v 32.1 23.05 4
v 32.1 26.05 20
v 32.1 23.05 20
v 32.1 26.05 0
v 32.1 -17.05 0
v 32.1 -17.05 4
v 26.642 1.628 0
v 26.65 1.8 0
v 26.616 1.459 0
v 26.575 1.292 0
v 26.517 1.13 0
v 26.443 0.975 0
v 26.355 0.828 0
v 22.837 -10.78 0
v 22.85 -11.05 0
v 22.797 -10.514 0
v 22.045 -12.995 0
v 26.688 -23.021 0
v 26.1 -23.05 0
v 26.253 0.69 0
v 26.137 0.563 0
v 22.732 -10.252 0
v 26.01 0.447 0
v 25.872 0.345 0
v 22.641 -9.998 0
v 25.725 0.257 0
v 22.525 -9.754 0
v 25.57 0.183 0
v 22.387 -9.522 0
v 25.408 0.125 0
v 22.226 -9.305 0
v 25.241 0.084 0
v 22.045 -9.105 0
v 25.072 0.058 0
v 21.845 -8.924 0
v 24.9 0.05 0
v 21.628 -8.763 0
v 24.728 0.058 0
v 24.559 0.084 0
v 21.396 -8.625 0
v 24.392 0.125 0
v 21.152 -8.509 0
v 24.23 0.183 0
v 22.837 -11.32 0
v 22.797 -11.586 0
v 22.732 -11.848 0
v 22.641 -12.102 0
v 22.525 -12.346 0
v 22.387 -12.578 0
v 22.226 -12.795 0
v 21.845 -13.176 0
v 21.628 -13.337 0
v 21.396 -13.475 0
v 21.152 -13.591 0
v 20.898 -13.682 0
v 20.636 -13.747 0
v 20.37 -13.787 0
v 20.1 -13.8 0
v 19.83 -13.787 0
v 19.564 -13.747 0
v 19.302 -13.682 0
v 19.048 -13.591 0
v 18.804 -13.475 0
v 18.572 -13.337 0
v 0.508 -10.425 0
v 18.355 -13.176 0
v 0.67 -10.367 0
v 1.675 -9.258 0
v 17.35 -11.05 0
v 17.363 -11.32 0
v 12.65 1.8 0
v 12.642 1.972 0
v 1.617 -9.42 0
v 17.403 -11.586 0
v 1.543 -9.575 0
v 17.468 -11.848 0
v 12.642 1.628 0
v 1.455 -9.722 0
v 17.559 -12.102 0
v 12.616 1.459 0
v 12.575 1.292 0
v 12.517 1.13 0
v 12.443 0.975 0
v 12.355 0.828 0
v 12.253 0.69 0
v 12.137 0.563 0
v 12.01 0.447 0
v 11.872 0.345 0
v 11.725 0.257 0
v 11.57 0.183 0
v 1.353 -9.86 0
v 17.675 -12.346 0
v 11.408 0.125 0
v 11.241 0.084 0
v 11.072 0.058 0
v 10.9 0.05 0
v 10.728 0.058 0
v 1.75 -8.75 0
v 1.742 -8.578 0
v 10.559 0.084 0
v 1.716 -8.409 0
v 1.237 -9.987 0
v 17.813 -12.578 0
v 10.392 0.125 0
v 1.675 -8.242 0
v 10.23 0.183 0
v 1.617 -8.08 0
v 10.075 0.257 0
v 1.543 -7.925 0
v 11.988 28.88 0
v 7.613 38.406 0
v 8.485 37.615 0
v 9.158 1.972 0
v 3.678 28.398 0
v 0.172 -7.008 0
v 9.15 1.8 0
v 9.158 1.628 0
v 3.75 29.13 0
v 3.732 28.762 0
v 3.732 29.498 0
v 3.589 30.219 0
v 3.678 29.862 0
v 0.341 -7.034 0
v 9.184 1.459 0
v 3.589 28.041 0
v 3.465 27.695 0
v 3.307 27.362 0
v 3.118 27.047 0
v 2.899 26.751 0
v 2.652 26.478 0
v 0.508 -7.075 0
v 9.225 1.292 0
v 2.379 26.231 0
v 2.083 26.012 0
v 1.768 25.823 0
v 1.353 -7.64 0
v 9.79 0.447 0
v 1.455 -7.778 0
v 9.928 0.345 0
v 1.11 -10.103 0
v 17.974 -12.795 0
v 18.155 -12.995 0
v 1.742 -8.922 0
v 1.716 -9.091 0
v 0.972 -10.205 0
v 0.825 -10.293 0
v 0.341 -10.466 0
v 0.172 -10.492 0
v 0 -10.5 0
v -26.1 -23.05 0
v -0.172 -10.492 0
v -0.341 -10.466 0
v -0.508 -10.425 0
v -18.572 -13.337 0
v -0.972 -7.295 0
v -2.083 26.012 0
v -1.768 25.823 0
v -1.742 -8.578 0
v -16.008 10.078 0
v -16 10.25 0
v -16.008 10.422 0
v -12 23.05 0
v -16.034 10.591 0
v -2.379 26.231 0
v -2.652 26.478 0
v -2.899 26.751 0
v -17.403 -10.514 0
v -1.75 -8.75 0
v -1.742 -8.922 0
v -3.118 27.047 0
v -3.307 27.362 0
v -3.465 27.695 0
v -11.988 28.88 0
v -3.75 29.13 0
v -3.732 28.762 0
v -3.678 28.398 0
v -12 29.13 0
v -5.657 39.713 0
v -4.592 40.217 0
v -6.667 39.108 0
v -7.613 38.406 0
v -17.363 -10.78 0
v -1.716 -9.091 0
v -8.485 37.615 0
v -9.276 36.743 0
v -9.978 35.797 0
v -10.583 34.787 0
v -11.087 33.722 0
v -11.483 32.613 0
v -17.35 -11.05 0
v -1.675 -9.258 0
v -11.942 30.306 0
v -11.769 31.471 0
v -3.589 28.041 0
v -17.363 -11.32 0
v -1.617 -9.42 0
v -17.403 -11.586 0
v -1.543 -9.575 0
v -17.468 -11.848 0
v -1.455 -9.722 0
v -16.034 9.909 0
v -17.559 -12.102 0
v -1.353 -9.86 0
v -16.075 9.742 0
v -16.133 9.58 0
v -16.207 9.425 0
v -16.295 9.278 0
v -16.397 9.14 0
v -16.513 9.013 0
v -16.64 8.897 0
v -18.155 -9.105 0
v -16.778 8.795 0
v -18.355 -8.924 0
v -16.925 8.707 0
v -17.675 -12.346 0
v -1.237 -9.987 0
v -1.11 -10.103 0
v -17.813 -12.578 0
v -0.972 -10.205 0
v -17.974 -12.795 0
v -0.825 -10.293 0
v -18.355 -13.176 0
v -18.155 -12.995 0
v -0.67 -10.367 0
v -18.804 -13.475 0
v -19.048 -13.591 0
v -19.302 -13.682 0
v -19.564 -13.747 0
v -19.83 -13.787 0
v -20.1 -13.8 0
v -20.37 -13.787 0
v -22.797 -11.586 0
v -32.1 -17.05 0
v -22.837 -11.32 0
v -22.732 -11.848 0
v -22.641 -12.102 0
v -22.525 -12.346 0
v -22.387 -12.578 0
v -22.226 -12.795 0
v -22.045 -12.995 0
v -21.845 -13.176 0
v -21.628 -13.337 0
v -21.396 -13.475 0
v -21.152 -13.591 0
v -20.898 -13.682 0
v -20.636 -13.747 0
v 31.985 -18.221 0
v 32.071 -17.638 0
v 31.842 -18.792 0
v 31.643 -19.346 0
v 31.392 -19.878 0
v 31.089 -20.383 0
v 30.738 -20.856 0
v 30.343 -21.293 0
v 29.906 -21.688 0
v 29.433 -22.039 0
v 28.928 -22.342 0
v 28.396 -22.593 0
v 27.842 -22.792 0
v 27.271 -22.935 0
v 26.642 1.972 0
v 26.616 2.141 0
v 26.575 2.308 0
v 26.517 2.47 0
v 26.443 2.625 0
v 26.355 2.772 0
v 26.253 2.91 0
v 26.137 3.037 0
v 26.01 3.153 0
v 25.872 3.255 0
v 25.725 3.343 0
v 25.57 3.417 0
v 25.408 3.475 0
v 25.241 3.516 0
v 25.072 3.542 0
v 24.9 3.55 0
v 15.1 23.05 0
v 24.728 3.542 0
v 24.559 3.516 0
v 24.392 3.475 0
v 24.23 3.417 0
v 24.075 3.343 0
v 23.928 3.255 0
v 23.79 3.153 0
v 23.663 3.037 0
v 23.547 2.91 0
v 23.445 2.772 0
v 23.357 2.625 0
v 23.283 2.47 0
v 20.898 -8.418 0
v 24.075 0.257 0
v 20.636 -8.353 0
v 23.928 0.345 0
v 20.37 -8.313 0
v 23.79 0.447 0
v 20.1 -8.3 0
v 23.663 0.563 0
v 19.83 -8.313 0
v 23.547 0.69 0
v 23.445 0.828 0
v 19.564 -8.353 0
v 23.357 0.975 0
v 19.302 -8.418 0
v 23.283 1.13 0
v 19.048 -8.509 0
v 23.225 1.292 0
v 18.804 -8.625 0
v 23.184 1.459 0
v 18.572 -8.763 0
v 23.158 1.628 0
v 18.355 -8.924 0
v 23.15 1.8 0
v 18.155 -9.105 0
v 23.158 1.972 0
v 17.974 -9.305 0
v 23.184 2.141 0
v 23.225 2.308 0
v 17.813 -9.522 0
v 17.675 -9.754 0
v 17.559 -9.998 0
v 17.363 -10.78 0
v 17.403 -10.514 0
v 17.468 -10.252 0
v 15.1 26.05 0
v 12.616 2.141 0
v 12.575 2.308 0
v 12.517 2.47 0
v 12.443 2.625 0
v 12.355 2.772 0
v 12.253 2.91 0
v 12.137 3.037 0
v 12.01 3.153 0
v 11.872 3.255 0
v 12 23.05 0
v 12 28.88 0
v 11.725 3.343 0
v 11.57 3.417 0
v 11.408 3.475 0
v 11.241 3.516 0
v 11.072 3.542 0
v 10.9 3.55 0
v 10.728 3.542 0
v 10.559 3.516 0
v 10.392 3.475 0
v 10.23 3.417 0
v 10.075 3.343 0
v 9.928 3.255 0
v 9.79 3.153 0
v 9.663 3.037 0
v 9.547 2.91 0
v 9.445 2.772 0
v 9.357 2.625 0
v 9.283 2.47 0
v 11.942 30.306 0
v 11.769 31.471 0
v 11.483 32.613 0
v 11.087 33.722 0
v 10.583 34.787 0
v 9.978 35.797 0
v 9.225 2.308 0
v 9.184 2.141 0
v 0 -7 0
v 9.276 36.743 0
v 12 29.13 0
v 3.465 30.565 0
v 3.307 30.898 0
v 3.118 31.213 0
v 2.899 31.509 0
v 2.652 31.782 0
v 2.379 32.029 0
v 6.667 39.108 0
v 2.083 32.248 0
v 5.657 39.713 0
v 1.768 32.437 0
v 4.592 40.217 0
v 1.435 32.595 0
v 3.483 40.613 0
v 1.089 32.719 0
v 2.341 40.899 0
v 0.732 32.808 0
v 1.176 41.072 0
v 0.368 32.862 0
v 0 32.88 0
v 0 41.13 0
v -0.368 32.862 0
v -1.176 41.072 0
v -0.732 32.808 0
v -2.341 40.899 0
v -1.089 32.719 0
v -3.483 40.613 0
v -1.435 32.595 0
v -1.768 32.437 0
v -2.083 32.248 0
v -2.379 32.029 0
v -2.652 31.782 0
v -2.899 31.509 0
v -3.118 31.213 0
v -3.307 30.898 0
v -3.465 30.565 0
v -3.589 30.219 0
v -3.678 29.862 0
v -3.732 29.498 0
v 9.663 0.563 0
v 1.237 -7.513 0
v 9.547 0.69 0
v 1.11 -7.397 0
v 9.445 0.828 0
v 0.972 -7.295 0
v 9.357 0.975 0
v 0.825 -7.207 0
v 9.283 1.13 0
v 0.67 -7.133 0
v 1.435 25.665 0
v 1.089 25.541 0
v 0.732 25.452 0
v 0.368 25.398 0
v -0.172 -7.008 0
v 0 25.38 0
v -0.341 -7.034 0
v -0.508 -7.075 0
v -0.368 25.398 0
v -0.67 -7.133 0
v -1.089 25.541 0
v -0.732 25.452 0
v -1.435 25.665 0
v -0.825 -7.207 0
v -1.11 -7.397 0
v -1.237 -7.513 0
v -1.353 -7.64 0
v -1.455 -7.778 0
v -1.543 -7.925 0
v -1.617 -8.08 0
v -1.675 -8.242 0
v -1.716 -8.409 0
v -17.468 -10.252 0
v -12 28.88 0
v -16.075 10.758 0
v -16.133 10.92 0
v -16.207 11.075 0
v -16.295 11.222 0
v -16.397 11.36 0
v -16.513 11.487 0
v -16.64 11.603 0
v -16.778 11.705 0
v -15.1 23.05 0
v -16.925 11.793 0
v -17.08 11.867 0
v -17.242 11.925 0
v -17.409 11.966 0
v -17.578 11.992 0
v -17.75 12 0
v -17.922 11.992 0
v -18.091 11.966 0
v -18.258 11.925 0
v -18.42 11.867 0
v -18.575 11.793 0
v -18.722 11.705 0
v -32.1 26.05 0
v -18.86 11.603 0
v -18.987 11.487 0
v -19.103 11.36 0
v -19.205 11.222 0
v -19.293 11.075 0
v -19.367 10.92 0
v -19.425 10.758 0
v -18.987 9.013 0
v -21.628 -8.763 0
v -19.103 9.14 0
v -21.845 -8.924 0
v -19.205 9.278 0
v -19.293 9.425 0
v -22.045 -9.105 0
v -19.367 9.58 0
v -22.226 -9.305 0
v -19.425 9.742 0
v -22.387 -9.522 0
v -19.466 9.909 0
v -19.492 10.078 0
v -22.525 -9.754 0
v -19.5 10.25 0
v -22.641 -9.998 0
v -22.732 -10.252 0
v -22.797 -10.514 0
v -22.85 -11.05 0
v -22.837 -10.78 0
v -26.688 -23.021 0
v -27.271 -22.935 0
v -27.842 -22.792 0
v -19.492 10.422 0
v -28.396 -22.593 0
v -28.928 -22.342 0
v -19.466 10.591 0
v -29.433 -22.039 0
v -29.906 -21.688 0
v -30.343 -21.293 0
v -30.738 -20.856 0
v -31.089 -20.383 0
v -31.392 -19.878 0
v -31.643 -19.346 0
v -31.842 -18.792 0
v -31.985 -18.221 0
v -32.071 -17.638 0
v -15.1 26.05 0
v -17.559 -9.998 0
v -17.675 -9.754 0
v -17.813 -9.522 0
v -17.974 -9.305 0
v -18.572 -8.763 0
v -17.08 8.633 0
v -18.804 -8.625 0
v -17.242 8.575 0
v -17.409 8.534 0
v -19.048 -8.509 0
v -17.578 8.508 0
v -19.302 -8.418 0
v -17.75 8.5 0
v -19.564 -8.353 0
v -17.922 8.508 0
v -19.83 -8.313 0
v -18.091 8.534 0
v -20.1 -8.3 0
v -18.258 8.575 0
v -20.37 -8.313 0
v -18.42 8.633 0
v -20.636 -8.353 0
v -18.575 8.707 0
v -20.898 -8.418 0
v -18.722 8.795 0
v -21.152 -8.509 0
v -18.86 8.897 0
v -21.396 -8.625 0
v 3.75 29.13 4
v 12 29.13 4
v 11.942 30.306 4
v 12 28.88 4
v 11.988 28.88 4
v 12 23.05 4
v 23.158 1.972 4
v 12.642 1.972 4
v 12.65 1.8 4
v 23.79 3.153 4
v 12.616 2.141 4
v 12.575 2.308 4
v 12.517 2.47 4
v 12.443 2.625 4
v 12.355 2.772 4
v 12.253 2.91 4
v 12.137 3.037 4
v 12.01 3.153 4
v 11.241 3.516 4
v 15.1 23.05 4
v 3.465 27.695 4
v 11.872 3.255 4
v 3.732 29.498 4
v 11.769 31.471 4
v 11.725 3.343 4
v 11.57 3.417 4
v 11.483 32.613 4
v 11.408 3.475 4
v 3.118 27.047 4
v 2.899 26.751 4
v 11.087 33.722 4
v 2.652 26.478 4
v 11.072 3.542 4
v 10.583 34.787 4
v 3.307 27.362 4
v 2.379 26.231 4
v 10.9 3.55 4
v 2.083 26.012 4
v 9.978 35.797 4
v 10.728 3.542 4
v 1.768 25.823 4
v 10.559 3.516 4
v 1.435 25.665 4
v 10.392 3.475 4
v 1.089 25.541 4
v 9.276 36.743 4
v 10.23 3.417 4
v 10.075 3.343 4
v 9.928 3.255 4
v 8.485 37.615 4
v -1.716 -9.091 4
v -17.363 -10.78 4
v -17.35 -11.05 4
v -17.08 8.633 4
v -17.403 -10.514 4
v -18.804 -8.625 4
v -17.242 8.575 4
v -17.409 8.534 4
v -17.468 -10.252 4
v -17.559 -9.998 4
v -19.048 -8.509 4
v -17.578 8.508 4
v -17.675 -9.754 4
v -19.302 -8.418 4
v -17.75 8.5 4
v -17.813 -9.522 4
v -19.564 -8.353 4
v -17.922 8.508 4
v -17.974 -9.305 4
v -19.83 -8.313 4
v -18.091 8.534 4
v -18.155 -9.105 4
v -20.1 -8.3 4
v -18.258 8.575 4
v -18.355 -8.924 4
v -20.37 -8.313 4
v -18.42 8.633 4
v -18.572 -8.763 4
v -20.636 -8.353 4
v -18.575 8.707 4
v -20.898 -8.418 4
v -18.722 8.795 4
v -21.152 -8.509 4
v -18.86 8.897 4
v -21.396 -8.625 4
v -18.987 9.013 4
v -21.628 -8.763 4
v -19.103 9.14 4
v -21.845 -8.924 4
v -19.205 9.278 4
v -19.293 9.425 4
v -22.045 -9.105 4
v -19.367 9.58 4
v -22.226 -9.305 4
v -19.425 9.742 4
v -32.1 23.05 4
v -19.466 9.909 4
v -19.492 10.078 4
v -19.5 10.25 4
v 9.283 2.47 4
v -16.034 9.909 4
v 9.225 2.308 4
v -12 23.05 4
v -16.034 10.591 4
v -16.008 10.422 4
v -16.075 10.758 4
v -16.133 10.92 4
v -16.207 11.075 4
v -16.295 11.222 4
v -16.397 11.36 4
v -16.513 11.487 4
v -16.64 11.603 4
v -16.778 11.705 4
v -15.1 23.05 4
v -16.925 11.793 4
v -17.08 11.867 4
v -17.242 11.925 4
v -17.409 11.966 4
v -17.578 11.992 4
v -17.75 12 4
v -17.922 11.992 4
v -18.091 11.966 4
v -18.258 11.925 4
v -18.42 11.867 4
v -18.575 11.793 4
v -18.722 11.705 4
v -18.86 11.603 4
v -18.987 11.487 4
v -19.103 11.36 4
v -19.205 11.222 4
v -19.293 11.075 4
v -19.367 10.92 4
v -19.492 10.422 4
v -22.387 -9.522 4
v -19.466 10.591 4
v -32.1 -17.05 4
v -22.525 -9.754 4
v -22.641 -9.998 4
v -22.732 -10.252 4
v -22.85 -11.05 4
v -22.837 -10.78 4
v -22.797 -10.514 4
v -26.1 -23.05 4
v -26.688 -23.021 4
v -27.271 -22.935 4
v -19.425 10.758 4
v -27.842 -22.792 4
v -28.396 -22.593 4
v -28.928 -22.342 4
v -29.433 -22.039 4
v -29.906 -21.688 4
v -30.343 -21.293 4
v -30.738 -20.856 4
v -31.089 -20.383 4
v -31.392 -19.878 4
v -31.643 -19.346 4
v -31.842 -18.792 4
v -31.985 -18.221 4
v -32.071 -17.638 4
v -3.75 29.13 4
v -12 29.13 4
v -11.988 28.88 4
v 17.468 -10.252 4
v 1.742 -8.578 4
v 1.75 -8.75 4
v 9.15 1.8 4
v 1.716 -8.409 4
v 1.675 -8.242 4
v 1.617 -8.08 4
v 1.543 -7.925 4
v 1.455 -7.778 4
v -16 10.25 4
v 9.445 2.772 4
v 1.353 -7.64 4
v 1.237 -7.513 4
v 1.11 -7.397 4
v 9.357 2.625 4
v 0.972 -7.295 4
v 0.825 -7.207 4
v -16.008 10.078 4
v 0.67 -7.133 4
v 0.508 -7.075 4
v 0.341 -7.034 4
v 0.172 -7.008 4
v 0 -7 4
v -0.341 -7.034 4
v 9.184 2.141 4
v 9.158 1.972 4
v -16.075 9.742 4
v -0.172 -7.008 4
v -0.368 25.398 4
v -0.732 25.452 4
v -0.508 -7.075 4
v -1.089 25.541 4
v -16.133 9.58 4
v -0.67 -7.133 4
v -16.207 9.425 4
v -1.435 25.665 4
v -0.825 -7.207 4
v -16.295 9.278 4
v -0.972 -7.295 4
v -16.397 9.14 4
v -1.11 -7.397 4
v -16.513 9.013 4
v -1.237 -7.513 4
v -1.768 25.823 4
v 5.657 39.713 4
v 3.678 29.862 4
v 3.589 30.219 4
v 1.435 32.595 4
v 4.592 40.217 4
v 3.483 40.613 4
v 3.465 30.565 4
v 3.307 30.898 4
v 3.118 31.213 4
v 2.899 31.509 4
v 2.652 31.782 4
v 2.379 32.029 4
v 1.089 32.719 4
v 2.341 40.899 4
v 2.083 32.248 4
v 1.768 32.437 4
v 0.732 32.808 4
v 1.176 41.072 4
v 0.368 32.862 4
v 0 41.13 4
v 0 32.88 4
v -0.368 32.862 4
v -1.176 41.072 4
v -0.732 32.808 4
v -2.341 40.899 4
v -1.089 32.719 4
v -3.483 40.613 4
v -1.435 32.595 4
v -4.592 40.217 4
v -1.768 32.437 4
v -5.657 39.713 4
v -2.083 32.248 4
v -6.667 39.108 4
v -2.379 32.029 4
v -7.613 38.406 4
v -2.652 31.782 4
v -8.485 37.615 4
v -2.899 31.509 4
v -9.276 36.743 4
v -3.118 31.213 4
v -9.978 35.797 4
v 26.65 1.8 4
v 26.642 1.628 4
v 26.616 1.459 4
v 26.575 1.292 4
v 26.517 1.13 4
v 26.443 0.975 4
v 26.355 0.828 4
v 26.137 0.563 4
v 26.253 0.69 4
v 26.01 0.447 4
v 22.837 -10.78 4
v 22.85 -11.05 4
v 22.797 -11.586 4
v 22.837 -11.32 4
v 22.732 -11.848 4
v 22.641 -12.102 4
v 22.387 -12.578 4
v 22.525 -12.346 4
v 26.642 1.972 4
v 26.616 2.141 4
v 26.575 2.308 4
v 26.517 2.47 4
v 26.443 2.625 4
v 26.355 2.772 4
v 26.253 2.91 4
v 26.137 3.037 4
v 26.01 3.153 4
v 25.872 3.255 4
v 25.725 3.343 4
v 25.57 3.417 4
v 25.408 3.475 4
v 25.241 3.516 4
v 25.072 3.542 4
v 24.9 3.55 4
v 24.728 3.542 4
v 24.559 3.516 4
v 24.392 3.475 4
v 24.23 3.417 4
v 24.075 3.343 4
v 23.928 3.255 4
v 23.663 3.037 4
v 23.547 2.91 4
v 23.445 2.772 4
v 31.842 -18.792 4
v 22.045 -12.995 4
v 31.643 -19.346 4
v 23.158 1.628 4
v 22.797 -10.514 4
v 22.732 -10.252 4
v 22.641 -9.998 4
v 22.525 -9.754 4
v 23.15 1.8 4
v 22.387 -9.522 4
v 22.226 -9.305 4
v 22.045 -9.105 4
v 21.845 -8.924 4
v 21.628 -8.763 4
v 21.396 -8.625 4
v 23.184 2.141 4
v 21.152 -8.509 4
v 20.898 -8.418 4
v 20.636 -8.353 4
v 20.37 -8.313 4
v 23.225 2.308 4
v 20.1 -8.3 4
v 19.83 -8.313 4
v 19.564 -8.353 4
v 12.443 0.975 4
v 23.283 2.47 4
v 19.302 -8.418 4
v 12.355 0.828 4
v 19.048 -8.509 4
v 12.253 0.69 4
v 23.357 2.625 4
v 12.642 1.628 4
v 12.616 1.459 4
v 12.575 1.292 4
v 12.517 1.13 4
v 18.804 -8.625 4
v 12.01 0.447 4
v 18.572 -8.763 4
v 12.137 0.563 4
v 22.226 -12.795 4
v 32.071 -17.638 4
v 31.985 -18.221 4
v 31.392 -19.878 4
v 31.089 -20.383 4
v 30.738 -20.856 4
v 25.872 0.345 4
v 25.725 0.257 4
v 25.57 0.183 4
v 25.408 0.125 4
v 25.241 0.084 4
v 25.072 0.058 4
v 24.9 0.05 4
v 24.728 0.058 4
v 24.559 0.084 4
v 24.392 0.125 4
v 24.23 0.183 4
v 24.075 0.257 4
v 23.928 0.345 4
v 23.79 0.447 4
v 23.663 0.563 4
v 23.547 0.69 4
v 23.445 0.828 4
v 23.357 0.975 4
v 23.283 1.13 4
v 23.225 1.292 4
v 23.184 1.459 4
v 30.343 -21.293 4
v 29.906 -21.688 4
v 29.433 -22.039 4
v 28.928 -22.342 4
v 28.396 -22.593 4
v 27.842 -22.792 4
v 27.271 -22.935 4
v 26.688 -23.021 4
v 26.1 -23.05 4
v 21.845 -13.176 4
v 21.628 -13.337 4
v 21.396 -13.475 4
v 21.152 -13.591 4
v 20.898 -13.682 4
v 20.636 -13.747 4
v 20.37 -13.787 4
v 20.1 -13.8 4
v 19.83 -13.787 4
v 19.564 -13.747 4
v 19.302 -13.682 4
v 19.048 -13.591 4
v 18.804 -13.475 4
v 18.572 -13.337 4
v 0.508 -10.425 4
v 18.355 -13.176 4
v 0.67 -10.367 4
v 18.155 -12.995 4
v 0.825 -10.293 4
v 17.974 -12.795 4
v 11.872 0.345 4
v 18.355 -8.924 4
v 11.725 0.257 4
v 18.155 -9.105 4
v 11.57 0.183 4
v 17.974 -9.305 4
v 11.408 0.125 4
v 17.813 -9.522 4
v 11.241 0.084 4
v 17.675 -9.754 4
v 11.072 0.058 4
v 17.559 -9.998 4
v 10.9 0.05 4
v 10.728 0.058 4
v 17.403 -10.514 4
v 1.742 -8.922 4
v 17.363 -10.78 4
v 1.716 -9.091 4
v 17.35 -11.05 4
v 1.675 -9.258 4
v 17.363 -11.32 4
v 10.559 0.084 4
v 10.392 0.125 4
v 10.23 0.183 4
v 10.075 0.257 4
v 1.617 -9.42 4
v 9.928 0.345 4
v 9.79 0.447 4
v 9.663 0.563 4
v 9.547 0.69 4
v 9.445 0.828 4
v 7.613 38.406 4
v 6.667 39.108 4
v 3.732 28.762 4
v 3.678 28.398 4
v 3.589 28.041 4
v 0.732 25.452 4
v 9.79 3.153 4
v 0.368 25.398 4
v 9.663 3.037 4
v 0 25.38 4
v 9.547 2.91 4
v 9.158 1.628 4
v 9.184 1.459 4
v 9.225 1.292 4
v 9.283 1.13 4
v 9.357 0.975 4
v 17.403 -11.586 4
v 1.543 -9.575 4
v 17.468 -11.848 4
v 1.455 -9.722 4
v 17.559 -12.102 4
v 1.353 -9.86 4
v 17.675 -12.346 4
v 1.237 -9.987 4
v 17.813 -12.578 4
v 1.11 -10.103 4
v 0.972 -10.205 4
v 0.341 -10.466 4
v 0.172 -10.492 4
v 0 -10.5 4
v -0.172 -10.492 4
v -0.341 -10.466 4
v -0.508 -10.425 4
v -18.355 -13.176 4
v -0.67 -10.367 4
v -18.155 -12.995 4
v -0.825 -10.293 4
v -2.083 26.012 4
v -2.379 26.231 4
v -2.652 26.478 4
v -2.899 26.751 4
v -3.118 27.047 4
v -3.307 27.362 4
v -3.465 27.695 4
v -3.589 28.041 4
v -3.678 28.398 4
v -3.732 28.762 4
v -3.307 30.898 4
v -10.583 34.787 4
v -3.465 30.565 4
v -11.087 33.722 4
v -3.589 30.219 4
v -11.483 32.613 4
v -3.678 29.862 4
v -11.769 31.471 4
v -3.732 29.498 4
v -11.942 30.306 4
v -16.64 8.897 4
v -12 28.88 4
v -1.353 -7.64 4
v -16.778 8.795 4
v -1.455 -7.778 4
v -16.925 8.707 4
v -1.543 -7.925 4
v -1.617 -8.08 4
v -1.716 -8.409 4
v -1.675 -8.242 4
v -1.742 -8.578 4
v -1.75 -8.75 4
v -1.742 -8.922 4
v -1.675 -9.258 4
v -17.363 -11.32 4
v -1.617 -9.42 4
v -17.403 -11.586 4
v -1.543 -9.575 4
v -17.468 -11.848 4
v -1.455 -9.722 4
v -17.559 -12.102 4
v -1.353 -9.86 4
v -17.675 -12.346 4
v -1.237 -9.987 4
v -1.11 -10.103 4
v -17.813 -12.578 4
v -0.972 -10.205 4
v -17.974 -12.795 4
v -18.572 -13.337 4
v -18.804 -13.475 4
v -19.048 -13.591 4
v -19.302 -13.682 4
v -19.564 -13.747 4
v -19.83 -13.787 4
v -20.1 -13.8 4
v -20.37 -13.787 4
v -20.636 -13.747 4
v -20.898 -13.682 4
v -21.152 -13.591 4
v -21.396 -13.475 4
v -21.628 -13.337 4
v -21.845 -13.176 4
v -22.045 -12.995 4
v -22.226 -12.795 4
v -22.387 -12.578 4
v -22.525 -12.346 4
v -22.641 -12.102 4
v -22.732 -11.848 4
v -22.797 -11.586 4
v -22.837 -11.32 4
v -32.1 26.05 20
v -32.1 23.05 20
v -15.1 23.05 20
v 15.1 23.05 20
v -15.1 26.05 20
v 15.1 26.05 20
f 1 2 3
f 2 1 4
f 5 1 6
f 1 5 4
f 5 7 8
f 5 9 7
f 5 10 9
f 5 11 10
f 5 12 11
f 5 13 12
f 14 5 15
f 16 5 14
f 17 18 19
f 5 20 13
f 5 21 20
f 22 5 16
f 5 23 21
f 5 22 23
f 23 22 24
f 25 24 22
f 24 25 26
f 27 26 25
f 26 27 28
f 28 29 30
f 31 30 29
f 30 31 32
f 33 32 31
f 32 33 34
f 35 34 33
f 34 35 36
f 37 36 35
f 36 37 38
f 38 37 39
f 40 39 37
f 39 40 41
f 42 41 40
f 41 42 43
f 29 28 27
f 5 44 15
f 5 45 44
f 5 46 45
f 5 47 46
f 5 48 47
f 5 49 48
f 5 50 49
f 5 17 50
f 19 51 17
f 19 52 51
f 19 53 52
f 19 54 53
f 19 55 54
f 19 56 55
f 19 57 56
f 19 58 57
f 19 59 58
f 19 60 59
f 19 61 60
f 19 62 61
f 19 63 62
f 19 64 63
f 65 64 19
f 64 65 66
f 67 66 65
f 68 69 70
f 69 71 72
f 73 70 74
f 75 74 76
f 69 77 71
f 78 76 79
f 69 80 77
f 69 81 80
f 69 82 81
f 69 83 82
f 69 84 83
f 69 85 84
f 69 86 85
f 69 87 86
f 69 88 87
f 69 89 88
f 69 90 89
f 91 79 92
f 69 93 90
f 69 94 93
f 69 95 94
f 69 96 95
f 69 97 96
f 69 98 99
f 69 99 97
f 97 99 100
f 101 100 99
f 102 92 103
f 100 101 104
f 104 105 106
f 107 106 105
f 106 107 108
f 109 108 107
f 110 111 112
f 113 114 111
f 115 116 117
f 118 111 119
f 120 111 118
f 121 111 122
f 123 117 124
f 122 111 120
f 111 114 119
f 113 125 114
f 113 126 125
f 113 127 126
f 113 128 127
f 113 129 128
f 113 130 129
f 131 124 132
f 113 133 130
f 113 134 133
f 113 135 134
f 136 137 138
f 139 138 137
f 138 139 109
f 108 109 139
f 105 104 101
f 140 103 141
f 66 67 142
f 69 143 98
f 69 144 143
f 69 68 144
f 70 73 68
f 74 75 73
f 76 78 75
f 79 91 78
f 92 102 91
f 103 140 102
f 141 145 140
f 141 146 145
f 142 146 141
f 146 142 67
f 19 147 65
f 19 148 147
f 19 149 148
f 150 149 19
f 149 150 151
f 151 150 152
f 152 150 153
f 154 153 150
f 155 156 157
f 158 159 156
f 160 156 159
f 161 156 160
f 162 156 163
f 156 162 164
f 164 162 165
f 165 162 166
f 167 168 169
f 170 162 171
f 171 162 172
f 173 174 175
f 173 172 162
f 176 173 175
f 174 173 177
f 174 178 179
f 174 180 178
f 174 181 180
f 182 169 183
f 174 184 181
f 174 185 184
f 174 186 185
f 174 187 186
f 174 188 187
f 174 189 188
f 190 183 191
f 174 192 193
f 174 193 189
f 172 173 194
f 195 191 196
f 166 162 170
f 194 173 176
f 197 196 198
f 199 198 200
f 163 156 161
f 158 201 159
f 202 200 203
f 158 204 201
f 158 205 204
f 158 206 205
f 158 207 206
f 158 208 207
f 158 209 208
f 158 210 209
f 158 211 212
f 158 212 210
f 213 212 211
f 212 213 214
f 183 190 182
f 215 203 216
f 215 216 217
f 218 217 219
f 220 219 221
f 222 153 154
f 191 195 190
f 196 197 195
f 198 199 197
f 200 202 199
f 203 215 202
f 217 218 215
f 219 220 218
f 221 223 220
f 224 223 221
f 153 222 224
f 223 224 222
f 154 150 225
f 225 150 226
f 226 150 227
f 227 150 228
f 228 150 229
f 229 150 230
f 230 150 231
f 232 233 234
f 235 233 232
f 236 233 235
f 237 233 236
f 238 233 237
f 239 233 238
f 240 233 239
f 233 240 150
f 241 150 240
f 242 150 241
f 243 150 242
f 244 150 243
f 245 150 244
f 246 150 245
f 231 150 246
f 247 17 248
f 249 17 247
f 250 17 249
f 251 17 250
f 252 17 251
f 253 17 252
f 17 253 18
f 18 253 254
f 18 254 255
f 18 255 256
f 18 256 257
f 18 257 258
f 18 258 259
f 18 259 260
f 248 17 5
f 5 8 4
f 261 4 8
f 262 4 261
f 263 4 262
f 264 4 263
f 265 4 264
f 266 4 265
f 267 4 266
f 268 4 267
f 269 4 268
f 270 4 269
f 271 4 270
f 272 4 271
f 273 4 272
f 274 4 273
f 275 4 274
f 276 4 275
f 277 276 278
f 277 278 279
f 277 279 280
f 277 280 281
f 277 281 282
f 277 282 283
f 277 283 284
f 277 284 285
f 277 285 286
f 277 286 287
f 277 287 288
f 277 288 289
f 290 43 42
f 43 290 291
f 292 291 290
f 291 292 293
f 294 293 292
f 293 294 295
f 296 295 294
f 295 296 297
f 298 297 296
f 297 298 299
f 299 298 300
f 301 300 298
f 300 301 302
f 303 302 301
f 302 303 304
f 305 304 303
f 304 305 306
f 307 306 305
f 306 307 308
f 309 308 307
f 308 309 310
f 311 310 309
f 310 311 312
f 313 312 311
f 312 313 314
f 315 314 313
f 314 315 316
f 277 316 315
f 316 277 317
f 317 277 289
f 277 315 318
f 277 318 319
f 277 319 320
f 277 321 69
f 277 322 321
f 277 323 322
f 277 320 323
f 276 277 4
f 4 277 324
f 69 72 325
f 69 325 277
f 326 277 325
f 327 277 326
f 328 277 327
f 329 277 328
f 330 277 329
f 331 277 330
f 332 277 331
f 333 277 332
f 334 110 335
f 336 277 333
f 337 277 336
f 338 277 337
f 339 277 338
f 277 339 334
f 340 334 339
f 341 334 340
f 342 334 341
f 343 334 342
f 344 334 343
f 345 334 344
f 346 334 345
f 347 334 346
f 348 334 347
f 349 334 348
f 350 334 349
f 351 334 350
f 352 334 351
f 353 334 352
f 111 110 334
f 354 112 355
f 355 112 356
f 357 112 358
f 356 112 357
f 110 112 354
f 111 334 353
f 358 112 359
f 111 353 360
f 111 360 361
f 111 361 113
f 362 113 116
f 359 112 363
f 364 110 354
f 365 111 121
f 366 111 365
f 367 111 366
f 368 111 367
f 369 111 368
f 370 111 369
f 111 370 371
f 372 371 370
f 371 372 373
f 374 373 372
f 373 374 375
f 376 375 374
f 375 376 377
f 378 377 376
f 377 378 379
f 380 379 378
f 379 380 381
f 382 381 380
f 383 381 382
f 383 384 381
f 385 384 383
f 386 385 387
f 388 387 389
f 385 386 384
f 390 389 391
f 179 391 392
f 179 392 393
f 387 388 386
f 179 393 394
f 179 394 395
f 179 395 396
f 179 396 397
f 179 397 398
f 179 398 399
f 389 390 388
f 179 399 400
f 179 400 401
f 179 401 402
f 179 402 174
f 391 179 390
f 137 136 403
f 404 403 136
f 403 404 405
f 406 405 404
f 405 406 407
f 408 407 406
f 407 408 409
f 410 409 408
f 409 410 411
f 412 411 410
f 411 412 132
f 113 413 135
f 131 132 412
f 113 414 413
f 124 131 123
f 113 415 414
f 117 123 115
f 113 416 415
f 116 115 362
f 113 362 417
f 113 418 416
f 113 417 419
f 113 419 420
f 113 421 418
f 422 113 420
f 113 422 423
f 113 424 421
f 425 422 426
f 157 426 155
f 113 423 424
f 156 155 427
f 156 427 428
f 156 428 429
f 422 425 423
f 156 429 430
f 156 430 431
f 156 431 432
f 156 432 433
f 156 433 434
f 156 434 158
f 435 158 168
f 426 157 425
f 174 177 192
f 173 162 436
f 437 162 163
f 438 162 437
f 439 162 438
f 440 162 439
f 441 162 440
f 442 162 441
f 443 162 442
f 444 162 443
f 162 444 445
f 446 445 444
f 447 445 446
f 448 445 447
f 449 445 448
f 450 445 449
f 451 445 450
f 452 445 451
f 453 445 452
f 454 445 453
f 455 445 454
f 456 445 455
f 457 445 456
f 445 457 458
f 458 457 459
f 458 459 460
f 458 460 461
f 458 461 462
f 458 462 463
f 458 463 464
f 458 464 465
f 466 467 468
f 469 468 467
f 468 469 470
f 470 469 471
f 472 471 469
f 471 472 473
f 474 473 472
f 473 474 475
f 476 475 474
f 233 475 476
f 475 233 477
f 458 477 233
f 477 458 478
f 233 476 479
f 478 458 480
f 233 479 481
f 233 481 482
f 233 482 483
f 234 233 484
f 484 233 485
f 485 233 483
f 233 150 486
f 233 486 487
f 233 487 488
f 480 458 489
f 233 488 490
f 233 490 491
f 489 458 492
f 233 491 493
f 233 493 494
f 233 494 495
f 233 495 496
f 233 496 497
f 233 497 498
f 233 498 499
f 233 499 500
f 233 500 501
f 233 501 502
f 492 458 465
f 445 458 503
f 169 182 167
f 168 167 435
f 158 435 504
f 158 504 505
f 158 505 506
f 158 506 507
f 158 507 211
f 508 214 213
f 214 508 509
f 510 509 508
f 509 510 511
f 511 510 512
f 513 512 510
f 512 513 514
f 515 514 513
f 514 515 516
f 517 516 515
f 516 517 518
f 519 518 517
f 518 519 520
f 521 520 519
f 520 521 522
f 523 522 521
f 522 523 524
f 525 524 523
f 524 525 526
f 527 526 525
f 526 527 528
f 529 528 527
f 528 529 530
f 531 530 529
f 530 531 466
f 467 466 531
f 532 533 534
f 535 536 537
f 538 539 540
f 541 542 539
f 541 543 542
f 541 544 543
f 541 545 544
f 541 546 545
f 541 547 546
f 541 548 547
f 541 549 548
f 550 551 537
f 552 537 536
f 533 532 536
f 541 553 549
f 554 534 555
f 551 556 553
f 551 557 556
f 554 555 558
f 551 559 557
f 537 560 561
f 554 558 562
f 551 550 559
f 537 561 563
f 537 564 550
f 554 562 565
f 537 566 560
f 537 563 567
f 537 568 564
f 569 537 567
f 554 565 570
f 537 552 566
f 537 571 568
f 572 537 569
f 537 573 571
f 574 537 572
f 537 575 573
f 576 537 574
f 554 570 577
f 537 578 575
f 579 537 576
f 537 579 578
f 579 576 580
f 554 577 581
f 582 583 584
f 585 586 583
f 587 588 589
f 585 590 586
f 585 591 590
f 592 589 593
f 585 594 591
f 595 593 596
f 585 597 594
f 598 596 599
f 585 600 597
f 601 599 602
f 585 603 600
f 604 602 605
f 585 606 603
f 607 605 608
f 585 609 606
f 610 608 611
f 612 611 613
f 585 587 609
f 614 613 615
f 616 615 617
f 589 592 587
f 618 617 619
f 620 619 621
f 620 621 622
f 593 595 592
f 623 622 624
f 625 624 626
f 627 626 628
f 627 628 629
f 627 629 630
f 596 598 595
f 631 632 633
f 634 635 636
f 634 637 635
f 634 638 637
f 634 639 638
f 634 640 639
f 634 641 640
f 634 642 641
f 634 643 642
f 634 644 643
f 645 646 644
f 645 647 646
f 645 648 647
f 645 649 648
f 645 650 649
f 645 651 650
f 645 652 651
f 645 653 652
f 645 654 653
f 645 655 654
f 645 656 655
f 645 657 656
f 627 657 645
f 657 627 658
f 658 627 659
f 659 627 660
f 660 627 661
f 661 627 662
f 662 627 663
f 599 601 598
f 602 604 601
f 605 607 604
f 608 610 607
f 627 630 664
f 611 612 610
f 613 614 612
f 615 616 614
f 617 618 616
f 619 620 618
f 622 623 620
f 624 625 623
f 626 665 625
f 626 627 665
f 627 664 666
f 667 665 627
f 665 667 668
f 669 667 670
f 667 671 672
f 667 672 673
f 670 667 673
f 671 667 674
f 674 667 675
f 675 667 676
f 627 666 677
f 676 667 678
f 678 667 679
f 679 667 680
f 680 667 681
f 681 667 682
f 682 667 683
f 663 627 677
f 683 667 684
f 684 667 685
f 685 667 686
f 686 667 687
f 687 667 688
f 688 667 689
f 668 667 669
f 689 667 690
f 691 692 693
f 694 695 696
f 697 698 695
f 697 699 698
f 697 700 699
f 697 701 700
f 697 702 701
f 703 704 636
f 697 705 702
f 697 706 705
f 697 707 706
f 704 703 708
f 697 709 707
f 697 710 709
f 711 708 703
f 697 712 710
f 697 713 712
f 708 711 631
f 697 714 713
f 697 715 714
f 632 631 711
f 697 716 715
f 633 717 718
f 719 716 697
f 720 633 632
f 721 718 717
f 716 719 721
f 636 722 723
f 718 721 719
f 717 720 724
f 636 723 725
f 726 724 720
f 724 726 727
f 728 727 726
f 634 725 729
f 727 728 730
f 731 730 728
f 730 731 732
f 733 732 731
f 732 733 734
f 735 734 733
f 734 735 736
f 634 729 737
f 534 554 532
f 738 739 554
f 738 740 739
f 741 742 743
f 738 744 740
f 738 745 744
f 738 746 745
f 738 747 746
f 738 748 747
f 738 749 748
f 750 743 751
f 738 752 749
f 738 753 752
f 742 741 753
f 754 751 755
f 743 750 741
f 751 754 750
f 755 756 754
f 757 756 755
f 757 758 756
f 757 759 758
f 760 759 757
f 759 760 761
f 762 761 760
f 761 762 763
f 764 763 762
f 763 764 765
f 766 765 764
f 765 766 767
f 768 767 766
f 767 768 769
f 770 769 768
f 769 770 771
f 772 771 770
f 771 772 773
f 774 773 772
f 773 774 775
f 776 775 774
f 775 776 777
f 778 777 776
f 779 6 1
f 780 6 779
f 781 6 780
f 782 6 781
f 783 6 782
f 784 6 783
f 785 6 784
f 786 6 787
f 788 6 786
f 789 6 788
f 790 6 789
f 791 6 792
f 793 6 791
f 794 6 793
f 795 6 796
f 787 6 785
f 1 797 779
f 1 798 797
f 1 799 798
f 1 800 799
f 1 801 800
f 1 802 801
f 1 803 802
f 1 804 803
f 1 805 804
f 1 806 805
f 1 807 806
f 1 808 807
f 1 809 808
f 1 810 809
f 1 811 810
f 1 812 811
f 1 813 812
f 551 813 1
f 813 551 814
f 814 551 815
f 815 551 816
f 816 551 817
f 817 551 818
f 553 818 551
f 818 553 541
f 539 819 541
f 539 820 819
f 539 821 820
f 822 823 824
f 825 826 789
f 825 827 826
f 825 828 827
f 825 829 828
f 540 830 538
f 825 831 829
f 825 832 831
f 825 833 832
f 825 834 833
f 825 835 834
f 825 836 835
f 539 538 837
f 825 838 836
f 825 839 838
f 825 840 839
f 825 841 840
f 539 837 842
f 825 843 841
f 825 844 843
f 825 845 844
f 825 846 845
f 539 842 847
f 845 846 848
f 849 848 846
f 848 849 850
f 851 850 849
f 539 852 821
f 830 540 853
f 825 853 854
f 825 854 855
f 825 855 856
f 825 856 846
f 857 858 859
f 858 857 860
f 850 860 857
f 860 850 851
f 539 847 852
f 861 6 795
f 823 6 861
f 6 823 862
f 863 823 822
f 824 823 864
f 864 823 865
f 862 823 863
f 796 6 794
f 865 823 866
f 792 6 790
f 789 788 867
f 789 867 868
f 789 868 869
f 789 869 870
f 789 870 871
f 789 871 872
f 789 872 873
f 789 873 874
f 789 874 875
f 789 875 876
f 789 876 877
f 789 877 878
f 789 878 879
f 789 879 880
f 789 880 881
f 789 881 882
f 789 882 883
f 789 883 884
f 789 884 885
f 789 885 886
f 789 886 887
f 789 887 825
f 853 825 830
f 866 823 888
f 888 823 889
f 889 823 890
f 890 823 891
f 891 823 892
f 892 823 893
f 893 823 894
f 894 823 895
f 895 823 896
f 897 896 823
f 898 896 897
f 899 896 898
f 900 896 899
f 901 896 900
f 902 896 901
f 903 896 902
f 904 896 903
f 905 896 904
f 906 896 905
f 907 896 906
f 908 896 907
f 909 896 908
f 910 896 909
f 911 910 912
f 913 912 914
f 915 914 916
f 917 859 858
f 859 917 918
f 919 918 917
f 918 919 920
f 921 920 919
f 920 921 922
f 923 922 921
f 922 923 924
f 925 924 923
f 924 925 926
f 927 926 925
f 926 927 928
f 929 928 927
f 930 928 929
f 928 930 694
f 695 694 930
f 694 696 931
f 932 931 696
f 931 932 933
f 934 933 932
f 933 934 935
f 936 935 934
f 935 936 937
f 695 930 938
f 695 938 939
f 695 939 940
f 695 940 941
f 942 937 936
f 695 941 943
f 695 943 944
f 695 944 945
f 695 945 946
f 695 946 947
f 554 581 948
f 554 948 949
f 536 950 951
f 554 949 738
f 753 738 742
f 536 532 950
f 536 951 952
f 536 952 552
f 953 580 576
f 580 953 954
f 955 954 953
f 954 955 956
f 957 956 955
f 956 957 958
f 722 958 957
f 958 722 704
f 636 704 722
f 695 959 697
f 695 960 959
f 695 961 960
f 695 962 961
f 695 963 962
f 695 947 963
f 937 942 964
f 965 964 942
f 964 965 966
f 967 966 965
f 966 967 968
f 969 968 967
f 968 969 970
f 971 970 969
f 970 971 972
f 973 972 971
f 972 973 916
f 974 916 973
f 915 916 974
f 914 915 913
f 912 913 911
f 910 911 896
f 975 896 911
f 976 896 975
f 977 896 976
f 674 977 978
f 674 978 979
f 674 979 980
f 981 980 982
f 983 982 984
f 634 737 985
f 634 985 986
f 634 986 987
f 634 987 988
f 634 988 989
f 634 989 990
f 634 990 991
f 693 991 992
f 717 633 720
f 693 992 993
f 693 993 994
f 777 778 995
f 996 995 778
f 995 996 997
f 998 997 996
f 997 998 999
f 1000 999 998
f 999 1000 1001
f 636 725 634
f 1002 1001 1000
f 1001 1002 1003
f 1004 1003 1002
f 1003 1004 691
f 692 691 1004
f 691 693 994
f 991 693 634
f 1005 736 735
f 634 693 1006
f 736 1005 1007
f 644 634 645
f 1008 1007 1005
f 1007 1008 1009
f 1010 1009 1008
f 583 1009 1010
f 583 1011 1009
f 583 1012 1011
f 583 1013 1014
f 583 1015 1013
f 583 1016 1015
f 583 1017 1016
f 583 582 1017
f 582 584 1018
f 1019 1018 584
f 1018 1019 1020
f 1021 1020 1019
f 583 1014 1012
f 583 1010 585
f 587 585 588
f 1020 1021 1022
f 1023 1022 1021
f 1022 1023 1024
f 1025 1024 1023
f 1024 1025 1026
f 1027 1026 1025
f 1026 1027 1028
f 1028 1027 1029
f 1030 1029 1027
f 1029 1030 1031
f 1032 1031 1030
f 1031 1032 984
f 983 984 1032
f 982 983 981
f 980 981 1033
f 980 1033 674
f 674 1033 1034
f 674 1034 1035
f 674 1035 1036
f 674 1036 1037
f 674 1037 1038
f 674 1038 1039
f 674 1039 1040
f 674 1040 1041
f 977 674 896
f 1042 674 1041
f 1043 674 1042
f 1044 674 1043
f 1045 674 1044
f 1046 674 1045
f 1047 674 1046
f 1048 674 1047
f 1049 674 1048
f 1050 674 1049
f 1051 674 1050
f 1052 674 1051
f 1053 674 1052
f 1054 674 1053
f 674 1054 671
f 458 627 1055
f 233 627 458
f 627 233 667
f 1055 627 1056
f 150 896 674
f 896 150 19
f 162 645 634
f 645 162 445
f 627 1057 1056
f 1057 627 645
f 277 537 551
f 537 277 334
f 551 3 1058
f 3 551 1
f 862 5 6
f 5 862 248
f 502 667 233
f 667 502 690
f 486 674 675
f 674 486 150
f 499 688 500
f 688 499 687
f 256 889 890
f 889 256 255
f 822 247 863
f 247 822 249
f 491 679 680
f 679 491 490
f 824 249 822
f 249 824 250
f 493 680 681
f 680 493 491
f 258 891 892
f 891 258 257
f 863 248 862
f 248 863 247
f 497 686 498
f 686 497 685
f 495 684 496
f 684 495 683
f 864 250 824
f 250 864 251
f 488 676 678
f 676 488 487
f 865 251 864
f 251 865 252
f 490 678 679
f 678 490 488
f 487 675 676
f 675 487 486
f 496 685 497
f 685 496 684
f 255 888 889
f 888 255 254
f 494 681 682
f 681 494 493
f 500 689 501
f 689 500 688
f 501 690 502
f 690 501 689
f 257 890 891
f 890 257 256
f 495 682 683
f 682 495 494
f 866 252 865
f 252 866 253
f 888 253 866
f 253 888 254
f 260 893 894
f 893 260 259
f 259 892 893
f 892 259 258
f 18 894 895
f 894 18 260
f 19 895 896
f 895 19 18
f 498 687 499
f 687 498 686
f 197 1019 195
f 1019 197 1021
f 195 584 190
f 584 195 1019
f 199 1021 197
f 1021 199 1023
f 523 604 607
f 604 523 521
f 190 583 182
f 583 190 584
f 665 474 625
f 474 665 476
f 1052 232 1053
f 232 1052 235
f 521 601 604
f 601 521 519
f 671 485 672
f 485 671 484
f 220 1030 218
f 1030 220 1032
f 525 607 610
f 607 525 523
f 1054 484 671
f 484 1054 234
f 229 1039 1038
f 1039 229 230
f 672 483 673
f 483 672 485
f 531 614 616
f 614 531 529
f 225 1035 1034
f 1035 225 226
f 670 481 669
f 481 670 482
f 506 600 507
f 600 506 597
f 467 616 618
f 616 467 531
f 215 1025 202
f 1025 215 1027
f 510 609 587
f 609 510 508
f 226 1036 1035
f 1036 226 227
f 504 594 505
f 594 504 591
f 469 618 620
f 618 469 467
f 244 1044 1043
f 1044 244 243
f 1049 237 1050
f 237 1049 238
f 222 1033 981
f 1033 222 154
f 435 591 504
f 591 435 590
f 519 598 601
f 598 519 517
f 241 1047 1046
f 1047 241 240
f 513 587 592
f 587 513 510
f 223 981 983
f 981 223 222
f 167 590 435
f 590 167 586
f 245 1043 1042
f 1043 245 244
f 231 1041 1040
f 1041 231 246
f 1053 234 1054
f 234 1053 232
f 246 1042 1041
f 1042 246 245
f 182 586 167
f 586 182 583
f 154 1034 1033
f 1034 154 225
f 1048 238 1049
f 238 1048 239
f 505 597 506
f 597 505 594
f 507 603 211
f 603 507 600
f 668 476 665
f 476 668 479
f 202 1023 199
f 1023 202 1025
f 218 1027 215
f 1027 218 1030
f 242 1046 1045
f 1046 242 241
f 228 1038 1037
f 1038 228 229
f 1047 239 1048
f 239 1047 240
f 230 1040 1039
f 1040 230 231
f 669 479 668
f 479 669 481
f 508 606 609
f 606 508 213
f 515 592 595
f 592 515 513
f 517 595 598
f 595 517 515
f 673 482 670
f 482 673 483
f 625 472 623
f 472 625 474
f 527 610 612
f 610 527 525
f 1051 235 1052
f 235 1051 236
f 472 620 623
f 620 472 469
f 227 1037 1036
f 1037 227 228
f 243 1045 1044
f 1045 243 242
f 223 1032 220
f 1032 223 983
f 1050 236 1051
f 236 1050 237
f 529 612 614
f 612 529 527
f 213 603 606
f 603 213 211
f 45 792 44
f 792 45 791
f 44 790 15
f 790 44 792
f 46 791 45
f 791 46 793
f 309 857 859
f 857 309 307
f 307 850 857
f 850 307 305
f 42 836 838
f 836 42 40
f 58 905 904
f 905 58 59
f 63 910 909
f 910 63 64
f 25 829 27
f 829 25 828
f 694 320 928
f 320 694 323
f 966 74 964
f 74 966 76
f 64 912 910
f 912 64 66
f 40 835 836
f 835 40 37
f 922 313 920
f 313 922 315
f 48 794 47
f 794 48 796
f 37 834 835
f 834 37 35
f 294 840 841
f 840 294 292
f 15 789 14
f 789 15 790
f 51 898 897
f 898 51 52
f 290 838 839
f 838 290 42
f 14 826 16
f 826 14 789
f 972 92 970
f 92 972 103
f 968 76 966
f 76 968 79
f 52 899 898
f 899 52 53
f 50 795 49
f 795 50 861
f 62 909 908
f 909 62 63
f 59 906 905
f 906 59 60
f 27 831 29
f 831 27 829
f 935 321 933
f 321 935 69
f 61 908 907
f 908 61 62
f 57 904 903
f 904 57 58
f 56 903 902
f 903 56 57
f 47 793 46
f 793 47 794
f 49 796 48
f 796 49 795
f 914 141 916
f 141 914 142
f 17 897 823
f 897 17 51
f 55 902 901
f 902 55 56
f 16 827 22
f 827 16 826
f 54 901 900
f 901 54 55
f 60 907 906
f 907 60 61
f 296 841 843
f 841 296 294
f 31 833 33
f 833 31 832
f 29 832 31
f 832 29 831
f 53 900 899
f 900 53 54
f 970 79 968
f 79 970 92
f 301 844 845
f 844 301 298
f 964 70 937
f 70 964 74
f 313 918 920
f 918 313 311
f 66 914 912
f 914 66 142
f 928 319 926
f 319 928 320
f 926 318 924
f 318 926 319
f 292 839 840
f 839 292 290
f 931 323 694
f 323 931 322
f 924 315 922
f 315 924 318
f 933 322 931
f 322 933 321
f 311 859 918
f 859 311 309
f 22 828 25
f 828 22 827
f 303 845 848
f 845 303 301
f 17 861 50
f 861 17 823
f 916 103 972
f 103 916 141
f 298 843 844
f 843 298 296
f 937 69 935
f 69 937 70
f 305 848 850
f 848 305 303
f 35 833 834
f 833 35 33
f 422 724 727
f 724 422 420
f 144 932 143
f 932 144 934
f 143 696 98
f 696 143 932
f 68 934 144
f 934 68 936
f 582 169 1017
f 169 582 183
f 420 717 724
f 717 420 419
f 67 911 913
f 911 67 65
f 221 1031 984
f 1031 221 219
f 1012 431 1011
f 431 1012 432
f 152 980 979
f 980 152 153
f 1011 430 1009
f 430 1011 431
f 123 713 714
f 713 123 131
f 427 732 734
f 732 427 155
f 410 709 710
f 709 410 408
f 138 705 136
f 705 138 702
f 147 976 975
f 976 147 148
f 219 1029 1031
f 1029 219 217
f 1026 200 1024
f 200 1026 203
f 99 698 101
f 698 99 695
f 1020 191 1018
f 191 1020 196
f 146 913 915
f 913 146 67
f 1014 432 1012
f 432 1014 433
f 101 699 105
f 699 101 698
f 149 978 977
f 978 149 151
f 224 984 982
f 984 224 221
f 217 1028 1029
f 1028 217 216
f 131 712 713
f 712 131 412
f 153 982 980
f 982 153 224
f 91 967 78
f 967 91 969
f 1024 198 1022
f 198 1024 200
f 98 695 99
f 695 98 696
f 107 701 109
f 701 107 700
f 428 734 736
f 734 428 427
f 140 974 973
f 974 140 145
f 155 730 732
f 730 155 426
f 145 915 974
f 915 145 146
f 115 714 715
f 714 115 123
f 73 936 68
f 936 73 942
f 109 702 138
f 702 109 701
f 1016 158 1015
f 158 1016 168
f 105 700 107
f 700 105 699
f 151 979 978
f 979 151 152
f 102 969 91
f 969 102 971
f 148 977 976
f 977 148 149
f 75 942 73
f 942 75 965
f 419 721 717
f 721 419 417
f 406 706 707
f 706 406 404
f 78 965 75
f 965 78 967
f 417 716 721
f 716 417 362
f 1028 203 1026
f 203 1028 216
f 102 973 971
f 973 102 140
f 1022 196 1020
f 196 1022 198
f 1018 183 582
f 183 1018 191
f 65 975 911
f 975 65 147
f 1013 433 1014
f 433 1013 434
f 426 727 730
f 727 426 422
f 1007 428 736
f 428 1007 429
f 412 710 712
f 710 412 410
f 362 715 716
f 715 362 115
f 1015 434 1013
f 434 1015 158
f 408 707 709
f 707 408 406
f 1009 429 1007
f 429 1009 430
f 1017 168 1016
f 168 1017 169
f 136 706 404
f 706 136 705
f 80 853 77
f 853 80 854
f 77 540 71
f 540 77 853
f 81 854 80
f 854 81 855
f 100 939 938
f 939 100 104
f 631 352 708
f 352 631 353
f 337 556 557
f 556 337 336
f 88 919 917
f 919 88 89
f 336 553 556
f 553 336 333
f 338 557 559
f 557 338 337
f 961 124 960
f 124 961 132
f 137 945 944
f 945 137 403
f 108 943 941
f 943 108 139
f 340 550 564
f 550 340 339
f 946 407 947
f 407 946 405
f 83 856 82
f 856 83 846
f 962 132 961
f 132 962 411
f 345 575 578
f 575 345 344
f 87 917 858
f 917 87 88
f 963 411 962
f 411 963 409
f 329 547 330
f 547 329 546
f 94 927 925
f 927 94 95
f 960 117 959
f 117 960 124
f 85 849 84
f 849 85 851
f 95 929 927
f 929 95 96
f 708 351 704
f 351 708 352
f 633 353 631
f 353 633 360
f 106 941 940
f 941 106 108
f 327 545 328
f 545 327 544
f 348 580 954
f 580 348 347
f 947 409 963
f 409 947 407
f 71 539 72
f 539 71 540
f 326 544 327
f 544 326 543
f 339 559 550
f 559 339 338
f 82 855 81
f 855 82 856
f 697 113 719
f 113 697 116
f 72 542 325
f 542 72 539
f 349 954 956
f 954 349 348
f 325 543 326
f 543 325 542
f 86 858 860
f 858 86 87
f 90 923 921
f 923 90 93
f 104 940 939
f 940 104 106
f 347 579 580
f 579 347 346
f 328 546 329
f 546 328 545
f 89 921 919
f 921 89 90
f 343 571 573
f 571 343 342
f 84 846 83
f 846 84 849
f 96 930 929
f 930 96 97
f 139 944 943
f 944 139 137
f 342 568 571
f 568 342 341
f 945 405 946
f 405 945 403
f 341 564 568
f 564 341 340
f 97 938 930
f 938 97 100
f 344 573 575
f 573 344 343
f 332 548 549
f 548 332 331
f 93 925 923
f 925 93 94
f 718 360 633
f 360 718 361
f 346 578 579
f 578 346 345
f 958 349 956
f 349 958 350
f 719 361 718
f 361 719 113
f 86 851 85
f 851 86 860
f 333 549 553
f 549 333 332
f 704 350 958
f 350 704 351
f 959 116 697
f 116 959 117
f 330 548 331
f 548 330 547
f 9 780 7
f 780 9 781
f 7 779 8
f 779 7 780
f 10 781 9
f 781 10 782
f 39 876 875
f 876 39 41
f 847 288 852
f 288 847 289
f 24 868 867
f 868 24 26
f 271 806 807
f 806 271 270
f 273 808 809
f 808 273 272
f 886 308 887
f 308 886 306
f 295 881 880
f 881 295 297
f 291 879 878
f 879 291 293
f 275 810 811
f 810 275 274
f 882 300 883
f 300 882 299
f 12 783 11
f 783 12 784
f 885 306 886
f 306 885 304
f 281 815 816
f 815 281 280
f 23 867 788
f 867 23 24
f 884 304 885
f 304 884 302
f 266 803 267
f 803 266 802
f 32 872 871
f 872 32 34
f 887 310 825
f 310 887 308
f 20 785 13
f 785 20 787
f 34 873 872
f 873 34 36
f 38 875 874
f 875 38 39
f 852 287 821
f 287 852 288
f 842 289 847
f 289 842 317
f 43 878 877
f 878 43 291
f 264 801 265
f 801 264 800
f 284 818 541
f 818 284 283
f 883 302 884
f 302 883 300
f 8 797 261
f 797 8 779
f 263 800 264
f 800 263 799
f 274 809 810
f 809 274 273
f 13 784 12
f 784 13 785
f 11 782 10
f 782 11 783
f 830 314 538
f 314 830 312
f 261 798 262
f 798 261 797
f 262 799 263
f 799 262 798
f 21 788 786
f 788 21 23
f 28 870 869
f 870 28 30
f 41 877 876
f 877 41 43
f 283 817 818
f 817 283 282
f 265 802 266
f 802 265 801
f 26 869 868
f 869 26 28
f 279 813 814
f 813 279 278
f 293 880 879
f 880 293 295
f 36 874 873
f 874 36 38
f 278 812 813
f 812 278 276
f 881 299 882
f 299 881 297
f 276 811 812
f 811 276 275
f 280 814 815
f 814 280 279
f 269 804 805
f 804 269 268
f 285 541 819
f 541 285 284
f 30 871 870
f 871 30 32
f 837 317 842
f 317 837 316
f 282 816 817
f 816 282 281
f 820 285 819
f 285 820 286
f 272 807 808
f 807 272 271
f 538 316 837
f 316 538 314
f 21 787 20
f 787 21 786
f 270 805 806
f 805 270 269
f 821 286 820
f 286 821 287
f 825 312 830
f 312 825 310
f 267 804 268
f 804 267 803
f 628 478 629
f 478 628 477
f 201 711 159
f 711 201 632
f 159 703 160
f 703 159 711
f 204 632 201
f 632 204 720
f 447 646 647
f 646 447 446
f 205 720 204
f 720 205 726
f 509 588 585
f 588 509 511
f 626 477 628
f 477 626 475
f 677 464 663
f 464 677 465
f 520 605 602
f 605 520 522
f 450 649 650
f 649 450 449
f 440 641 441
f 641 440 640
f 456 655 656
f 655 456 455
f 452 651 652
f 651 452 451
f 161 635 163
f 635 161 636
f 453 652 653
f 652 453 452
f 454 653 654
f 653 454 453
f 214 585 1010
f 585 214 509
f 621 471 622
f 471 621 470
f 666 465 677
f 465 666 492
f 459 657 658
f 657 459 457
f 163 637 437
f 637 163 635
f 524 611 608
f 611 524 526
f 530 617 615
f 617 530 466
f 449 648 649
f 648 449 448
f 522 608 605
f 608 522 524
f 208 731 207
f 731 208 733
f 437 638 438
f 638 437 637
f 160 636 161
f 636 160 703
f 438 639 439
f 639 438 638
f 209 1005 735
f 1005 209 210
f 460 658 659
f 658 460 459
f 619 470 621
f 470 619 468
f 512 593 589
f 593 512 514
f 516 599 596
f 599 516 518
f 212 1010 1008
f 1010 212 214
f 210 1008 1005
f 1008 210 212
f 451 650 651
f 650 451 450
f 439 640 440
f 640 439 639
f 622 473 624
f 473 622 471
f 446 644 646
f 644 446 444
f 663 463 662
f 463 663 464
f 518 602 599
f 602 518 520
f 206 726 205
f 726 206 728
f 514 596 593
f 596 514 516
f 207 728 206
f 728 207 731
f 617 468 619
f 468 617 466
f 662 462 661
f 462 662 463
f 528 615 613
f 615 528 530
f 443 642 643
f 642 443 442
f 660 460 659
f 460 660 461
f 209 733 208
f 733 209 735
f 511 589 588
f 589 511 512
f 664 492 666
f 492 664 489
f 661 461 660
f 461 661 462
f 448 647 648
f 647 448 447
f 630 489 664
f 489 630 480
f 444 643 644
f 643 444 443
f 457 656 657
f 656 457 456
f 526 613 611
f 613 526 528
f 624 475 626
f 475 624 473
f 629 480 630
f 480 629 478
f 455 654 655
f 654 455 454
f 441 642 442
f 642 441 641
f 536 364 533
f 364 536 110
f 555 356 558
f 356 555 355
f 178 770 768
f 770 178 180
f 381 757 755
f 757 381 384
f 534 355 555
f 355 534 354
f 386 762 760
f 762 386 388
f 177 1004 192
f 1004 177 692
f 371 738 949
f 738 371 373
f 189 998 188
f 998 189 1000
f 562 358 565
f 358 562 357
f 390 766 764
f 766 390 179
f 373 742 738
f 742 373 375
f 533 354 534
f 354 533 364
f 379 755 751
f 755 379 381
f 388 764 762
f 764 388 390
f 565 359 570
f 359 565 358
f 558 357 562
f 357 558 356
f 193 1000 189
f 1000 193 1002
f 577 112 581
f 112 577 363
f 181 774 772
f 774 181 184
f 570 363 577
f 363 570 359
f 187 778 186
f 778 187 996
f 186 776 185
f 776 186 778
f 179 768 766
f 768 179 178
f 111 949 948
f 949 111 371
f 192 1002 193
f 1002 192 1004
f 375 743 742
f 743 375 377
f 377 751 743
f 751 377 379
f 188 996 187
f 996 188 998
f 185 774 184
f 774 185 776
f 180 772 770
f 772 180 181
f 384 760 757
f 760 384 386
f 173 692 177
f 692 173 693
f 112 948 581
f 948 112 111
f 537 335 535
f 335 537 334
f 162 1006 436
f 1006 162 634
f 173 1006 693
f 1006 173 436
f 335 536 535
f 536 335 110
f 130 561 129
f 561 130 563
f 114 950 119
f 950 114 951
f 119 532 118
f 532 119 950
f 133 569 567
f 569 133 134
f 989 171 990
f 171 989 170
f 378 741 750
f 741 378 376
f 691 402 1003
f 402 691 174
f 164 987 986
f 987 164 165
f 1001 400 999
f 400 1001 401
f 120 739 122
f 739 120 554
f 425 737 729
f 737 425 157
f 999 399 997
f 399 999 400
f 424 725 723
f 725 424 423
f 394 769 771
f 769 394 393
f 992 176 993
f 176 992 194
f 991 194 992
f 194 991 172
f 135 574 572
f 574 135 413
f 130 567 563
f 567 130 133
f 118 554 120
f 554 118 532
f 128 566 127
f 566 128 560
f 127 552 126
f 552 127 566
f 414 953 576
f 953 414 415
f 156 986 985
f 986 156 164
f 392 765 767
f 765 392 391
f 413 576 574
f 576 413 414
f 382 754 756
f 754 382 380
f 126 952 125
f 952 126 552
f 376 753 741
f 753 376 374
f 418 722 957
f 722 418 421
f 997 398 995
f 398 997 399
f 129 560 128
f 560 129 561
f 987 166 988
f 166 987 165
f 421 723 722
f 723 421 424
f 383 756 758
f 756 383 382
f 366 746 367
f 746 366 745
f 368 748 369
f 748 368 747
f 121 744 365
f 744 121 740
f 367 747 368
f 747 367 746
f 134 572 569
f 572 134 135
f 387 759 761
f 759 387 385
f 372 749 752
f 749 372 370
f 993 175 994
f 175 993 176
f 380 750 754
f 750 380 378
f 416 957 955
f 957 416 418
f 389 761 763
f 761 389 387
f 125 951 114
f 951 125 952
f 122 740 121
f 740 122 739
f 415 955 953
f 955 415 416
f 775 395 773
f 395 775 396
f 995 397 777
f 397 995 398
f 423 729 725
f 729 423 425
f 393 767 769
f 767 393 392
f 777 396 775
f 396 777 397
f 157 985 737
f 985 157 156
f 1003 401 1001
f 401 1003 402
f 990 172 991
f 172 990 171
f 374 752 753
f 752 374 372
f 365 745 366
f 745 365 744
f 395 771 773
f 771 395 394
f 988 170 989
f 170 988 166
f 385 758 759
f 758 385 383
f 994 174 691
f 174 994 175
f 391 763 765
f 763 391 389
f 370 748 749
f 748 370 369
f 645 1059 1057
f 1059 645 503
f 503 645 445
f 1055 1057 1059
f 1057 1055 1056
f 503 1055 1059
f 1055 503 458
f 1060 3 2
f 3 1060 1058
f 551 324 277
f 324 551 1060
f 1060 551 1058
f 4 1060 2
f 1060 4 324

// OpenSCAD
/*
 * Module Ender-hotend_plate.scad
 * Author: Anhtien Nguyen
 * Date created: Jun 23, 2018
 */
 
 gap=0.25;
 width=64.2;
 length=46.1;
 thickness=4;
 vslot_hole_dia= 5; // M5
 sml_hole_dia=3; // M3

// turn it upside down to print
translate([0,0,thickness/2]) rotate([180,0,0]) 
DrawPlate();

/*
 * Draw the plate and all the M5 and M3 holes
 */
module DrawPlate(){
     $fn=64;
     difference() {
        // draw the rectangle and cut the hole at top left & right
         union() {
         difference() {
              cube([width,length,thickness],center=true);
              translate([width/2,length/2,0]) cylinder(r=6,h=thickness+2,center=true);
              translate([-width/2,length/2,0]) cylinder(r=6,h=thickness+2,center=true);
         }
         // now fill the top left & right with round corner 6mm radius
         translate([0,0,-thickness/2]) roundedRect([width,length,thickness],6);
        }
         //left M5 hole
         translate([-width/2+12,length/2-12,0]) cylinder(r=vslot_hole_dia/2+gap,h=thickness+2,center=true);
        // right M5 hole
         translate([width/2-12,length/2-12,0]) cylinder(r=vslot_hole_dia/2+gap,h=thickness+2,center=true);
        // M3#1 is between those two M5 holes
        translate([0,length/2-14.3,0]) cylinder(r=sml_hole_dia/2+gap,h=thickness+2,center=true);
        // M3#2 is bottom right of M3#1
        translate([10.9,length/2-24.85,0]) cylinder(r=sml_hole_dia/2+gap,h=thickness+2,center=true);
        // M3#3 is at the right side of M3#2
        translate([10.9+14,length/2-24.85,0]) cylinder(r=sml_hole_dia/2+gap,h=thickness+2,center=true);
        // M3#4 is right below left M5
        translate([-17.75,length/2-14.3-19,0]) cylinder(r=sml_hole_dia/2+gap,h=thickness+2,center=true);
        } 
 /*
  * Add the R12 area at the bottom of the rectangle with the M5 hole in there
  */
    translate([0,-length/2-6.08,0]) difference() {
        union() {
        cylinder(r=12,h=thickness,center=true);       
        translate([-12,+gap,-thickness/2])cube([24,6,thickness]);
        }
        // link the R12 circle to the edge, hole is actuall M7 for eccentric nuts
        cylinder(r=(vslot_hole_dia+2)/2+gap,h=thickness+2,center=true);
    }
/*
 * Add the left and right tabs
 */
    translate([-width/2,-length/2-3,-20+thickness/2])cube([17,3,20]);
    translate([width/2-17,-length/2-3,-20+thickness/2])cube([17,3,20]);
}

module roundedRect(size, radius)
{
	x = size[0];
	y = size[1];
	z = size[2];

	linear_extrude(height=z)
	hull()
	{
		// place 2 circles at two ends, with the given radius
		translate([(-x/2)+(radius), (y/2)-(radius), 0])
		circle(r=radius);
		translate([(x/2)-(radius), (y/2)-(radius), 0])
		circle(r=radius);
	}
}
